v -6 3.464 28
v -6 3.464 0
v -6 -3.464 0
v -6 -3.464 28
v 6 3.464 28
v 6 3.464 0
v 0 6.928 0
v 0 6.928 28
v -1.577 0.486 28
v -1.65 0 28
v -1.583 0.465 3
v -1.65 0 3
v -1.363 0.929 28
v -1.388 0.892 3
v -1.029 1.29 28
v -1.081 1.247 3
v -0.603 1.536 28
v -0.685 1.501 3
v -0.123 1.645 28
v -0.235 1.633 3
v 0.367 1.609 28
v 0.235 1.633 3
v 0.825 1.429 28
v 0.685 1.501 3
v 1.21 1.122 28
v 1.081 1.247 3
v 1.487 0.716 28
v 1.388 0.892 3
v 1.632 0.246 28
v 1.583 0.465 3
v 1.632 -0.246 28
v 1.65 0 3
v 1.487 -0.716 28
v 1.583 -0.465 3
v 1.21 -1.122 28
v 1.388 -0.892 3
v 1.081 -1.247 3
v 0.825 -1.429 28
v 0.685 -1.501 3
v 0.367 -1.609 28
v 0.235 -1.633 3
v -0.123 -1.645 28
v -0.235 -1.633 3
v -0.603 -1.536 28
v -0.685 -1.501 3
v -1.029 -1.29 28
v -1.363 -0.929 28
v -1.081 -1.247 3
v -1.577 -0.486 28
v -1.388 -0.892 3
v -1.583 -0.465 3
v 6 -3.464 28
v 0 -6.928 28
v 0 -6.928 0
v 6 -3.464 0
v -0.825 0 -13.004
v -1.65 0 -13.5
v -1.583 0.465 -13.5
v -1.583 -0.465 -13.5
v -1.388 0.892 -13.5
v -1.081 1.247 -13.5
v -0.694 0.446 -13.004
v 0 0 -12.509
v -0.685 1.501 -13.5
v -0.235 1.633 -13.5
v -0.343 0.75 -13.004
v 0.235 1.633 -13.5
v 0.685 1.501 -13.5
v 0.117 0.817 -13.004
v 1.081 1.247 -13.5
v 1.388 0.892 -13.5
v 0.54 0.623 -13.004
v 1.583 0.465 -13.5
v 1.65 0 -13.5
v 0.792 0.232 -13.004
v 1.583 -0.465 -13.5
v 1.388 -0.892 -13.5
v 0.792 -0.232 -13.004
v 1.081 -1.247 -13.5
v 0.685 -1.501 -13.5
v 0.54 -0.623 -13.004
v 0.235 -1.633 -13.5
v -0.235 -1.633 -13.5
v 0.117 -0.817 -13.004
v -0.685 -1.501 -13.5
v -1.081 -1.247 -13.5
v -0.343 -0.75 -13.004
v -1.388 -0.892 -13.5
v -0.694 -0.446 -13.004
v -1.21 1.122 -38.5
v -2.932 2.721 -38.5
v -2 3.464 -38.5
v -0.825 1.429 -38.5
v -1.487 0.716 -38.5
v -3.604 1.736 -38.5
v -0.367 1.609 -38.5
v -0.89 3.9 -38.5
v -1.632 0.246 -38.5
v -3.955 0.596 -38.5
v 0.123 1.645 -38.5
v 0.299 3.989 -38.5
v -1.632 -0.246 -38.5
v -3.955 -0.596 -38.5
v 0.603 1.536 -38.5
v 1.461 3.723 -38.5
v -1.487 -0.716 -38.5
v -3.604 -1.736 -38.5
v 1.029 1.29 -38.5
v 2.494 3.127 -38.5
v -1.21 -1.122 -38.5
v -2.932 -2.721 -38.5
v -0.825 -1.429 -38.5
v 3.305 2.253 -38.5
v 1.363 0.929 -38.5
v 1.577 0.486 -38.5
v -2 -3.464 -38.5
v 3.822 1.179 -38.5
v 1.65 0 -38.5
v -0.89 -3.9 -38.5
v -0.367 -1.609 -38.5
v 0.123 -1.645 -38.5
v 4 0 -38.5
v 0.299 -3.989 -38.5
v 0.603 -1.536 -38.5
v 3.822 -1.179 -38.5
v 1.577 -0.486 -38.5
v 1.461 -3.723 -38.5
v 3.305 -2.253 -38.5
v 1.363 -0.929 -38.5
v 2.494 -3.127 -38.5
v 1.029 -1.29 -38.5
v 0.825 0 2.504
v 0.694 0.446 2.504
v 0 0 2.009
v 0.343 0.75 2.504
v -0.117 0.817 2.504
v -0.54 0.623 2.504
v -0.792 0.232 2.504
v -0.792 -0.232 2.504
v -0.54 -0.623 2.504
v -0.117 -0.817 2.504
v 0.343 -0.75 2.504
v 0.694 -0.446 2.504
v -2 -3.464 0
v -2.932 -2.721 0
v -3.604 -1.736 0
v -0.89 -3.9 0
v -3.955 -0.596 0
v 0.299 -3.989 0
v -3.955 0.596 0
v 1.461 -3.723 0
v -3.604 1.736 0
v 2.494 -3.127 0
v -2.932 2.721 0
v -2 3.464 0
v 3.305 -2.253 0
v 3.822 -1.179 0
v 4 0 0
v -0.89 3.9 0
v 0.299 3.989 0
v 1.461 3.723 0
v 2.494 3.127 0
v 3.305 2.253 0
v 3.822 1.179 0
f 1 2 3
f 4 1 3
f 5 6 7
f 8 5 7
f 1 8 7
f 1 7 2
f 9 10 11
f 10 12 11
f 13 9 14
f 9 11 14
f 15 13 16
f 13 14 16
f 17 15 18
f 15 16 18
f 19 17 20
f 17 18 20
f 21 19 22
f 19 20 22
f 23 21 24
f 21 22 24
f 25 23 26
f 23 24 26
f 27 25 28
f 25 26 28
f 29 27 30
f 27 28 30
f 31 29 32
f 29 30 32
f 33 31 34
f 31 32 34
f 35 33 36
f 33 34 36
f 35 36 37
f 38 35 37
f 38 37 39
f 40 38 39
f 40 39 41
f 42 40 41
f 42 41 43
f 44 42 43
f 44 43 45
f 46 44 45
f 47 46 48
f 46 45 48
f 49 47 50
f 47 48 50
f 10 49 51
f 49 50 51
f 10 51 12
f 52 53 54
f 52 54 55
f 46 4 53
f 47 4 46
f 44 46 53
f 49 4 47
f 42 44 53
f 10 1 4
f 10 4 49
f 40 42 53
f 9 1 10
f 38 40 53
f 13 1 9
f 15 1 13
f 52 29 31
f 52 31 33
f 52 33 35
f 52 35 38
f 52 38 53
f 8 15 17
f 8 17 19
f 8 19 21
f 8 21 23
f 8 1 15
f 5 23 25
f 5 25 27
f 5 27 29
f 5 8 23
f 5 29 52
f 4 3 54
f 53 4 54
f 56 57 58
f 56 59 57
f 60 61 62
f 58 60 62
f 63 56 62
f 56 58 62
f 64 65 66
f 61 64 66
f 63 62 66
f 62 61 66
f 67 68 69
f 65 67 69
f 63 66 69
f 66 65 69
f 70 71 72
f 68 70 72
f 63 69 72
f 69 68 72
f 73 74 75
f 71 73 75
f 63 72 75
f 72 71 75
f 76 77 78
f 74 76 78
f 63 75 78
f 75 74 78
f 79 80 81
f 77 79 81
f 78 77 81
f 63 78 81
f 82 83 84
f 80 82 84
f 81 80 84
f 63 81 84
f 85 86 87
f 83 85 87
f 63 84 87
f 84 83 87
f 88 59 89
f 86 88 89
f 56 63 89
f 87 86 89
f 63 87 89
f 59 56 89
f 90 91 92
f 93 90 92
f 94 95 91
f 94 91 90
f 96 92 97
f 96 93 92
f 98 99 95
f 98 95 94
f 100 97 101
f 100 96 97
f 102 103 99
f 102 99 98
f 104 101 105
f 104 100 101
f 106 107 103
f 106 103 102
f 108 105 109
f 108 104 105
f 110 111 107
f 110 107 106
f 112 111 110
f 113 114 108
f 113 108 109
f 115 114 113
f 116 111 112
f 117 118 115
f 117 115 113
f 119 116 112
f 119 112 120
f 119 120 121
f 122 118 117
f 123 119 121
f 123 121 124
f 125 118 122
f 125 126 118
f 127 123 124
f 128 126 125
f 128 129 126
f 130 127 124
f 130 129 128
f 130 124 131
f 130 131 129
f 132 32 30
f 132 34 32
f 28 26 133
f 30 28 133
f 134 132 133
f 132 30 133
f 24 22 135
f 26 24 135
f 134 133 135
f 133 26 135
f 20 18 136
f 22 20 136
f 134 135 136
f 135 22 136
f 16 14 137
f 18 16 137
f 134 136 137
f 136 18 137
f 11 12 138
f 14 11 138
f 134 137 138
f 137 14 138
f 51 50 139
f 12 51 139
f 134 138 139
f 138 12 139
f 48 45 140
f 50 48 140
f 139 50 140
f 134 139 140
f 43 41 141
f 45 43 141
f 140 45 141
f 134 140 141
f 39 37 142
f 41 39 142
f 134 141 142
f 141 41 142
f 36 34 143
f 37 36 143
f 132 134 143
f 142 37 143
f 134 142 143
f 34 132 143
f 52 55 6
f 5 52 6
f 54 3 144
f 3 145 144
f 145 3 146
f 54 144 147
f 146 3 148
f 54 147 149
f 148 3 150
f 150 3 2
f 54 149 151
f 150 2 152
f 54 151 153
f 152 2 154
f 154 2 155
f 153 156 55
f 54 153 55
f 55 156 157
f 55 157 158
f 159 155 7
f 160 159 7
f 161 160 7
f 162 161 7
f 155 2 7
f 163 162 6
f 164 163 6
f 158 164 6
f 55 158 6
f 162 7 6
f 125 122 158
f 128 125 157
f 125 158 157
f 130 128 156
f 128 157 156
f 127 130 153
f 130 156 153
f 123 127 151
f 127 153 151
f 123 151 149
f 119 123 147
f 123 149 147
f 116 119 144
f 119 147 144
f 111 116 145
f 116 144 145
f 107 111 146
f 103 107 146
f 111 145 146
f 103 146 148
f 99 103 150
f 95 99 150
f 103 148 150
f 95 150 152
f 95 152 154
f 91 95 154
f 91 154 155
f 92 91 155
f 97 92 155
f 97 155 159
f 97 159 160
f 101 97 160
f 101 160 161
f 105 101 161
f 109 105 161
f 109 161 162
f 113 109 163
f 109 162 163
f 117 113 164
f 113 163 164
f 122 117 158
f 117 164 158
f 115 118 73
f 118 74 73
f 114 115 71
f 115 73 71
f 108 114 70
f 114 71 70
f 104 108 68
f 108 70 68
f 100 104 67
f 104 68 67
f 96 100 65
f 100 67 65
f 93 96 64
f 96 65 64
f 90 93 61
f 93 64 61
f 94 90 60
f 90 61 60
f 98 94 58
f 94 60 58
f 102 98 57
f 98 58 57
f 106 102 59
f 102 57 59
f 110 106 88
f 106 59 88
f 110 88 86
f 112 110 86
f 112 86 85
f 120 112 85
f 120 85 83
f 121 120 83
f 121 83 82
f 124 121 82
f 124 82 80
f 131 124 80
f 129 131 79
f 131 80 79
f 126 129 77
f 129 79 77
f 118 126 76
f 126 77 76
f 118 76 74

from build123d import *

# Parameters (mm, degrees)
BASE_EXTRUSION_DEPTH = 28
ESQUISSE2_R          = 4
BOSS_EXTRU_1_DEPTH   = 38.5
PER_AGE1_D           = 3.3
PER_AGE1_DEPTH       = 25
PER_AGE1_TIP         = 0.991420021
PER_AGE2_D           = 3.3
PER_AGE2_DEPTH       = 25
PER_AGE2_TIP         = 0.991420021


with BuildPart() as part:
    # Esquisse1 → Base-Extrusion (new body)
    with BuildSketch(Plane.XY):
        Polygon((0, 6.92820323), (-6, 3.464101615), (-6, -3.464101615), (0, -6.92820323), (6, -3.464101615), (6, 3.464101615), align=None)
    extrude(amount=BASE_EXTRUSION_DEPTH)

    # Esquisse2 → Boss.-Extru.1 (add)
    with BuildSketch(Plane(origin=(0, 0, 0), x_dir=(-1, 0, 0), z_dir=(0, 0, -1))):
        with Locations(Location((0, 0, 0), (0, 0, 180))):
            Circle(ESQUISSE2_R)
    extrude(amount=BOSS_EXTRU_1_DEPTH)

    # Perçage1
    with Locations(Plane.XY.offset(28)):
        with Locations((0, 0)):
            Hole(PER_AGE1_D / 2, depth=PER_AGE1_DEPTH)
            with Locations((0, 0, -(PER_AGE1_DEPTH + PER_AGE1_TIP / 2))):  # 118° drill point
                Cone(0, PER_AGE1_D / 2, PER_AGE1_TIP, mode=Mode.SUBTRACT)

    # Perçage2
    with Locations(Plane(origin=(0, 0, -38.5), x_dir=(-1, 0, 0), z_dir=(0, 0, -1))):
        with Locations((0, 0)):
            Hole(PER_AGE2_D / 2, depth=PER_AGE2_DEPTH)
            with Locations((0, 0, -(PER_AGE2_DEPTH + PER_AGE2_TIP / 2))):  # 118° drill point
                Cone(0, PER_AGE2_D / 2, PER_AGE2_TIP, mode=Mode.SUBTRACT)


solid = part.part
